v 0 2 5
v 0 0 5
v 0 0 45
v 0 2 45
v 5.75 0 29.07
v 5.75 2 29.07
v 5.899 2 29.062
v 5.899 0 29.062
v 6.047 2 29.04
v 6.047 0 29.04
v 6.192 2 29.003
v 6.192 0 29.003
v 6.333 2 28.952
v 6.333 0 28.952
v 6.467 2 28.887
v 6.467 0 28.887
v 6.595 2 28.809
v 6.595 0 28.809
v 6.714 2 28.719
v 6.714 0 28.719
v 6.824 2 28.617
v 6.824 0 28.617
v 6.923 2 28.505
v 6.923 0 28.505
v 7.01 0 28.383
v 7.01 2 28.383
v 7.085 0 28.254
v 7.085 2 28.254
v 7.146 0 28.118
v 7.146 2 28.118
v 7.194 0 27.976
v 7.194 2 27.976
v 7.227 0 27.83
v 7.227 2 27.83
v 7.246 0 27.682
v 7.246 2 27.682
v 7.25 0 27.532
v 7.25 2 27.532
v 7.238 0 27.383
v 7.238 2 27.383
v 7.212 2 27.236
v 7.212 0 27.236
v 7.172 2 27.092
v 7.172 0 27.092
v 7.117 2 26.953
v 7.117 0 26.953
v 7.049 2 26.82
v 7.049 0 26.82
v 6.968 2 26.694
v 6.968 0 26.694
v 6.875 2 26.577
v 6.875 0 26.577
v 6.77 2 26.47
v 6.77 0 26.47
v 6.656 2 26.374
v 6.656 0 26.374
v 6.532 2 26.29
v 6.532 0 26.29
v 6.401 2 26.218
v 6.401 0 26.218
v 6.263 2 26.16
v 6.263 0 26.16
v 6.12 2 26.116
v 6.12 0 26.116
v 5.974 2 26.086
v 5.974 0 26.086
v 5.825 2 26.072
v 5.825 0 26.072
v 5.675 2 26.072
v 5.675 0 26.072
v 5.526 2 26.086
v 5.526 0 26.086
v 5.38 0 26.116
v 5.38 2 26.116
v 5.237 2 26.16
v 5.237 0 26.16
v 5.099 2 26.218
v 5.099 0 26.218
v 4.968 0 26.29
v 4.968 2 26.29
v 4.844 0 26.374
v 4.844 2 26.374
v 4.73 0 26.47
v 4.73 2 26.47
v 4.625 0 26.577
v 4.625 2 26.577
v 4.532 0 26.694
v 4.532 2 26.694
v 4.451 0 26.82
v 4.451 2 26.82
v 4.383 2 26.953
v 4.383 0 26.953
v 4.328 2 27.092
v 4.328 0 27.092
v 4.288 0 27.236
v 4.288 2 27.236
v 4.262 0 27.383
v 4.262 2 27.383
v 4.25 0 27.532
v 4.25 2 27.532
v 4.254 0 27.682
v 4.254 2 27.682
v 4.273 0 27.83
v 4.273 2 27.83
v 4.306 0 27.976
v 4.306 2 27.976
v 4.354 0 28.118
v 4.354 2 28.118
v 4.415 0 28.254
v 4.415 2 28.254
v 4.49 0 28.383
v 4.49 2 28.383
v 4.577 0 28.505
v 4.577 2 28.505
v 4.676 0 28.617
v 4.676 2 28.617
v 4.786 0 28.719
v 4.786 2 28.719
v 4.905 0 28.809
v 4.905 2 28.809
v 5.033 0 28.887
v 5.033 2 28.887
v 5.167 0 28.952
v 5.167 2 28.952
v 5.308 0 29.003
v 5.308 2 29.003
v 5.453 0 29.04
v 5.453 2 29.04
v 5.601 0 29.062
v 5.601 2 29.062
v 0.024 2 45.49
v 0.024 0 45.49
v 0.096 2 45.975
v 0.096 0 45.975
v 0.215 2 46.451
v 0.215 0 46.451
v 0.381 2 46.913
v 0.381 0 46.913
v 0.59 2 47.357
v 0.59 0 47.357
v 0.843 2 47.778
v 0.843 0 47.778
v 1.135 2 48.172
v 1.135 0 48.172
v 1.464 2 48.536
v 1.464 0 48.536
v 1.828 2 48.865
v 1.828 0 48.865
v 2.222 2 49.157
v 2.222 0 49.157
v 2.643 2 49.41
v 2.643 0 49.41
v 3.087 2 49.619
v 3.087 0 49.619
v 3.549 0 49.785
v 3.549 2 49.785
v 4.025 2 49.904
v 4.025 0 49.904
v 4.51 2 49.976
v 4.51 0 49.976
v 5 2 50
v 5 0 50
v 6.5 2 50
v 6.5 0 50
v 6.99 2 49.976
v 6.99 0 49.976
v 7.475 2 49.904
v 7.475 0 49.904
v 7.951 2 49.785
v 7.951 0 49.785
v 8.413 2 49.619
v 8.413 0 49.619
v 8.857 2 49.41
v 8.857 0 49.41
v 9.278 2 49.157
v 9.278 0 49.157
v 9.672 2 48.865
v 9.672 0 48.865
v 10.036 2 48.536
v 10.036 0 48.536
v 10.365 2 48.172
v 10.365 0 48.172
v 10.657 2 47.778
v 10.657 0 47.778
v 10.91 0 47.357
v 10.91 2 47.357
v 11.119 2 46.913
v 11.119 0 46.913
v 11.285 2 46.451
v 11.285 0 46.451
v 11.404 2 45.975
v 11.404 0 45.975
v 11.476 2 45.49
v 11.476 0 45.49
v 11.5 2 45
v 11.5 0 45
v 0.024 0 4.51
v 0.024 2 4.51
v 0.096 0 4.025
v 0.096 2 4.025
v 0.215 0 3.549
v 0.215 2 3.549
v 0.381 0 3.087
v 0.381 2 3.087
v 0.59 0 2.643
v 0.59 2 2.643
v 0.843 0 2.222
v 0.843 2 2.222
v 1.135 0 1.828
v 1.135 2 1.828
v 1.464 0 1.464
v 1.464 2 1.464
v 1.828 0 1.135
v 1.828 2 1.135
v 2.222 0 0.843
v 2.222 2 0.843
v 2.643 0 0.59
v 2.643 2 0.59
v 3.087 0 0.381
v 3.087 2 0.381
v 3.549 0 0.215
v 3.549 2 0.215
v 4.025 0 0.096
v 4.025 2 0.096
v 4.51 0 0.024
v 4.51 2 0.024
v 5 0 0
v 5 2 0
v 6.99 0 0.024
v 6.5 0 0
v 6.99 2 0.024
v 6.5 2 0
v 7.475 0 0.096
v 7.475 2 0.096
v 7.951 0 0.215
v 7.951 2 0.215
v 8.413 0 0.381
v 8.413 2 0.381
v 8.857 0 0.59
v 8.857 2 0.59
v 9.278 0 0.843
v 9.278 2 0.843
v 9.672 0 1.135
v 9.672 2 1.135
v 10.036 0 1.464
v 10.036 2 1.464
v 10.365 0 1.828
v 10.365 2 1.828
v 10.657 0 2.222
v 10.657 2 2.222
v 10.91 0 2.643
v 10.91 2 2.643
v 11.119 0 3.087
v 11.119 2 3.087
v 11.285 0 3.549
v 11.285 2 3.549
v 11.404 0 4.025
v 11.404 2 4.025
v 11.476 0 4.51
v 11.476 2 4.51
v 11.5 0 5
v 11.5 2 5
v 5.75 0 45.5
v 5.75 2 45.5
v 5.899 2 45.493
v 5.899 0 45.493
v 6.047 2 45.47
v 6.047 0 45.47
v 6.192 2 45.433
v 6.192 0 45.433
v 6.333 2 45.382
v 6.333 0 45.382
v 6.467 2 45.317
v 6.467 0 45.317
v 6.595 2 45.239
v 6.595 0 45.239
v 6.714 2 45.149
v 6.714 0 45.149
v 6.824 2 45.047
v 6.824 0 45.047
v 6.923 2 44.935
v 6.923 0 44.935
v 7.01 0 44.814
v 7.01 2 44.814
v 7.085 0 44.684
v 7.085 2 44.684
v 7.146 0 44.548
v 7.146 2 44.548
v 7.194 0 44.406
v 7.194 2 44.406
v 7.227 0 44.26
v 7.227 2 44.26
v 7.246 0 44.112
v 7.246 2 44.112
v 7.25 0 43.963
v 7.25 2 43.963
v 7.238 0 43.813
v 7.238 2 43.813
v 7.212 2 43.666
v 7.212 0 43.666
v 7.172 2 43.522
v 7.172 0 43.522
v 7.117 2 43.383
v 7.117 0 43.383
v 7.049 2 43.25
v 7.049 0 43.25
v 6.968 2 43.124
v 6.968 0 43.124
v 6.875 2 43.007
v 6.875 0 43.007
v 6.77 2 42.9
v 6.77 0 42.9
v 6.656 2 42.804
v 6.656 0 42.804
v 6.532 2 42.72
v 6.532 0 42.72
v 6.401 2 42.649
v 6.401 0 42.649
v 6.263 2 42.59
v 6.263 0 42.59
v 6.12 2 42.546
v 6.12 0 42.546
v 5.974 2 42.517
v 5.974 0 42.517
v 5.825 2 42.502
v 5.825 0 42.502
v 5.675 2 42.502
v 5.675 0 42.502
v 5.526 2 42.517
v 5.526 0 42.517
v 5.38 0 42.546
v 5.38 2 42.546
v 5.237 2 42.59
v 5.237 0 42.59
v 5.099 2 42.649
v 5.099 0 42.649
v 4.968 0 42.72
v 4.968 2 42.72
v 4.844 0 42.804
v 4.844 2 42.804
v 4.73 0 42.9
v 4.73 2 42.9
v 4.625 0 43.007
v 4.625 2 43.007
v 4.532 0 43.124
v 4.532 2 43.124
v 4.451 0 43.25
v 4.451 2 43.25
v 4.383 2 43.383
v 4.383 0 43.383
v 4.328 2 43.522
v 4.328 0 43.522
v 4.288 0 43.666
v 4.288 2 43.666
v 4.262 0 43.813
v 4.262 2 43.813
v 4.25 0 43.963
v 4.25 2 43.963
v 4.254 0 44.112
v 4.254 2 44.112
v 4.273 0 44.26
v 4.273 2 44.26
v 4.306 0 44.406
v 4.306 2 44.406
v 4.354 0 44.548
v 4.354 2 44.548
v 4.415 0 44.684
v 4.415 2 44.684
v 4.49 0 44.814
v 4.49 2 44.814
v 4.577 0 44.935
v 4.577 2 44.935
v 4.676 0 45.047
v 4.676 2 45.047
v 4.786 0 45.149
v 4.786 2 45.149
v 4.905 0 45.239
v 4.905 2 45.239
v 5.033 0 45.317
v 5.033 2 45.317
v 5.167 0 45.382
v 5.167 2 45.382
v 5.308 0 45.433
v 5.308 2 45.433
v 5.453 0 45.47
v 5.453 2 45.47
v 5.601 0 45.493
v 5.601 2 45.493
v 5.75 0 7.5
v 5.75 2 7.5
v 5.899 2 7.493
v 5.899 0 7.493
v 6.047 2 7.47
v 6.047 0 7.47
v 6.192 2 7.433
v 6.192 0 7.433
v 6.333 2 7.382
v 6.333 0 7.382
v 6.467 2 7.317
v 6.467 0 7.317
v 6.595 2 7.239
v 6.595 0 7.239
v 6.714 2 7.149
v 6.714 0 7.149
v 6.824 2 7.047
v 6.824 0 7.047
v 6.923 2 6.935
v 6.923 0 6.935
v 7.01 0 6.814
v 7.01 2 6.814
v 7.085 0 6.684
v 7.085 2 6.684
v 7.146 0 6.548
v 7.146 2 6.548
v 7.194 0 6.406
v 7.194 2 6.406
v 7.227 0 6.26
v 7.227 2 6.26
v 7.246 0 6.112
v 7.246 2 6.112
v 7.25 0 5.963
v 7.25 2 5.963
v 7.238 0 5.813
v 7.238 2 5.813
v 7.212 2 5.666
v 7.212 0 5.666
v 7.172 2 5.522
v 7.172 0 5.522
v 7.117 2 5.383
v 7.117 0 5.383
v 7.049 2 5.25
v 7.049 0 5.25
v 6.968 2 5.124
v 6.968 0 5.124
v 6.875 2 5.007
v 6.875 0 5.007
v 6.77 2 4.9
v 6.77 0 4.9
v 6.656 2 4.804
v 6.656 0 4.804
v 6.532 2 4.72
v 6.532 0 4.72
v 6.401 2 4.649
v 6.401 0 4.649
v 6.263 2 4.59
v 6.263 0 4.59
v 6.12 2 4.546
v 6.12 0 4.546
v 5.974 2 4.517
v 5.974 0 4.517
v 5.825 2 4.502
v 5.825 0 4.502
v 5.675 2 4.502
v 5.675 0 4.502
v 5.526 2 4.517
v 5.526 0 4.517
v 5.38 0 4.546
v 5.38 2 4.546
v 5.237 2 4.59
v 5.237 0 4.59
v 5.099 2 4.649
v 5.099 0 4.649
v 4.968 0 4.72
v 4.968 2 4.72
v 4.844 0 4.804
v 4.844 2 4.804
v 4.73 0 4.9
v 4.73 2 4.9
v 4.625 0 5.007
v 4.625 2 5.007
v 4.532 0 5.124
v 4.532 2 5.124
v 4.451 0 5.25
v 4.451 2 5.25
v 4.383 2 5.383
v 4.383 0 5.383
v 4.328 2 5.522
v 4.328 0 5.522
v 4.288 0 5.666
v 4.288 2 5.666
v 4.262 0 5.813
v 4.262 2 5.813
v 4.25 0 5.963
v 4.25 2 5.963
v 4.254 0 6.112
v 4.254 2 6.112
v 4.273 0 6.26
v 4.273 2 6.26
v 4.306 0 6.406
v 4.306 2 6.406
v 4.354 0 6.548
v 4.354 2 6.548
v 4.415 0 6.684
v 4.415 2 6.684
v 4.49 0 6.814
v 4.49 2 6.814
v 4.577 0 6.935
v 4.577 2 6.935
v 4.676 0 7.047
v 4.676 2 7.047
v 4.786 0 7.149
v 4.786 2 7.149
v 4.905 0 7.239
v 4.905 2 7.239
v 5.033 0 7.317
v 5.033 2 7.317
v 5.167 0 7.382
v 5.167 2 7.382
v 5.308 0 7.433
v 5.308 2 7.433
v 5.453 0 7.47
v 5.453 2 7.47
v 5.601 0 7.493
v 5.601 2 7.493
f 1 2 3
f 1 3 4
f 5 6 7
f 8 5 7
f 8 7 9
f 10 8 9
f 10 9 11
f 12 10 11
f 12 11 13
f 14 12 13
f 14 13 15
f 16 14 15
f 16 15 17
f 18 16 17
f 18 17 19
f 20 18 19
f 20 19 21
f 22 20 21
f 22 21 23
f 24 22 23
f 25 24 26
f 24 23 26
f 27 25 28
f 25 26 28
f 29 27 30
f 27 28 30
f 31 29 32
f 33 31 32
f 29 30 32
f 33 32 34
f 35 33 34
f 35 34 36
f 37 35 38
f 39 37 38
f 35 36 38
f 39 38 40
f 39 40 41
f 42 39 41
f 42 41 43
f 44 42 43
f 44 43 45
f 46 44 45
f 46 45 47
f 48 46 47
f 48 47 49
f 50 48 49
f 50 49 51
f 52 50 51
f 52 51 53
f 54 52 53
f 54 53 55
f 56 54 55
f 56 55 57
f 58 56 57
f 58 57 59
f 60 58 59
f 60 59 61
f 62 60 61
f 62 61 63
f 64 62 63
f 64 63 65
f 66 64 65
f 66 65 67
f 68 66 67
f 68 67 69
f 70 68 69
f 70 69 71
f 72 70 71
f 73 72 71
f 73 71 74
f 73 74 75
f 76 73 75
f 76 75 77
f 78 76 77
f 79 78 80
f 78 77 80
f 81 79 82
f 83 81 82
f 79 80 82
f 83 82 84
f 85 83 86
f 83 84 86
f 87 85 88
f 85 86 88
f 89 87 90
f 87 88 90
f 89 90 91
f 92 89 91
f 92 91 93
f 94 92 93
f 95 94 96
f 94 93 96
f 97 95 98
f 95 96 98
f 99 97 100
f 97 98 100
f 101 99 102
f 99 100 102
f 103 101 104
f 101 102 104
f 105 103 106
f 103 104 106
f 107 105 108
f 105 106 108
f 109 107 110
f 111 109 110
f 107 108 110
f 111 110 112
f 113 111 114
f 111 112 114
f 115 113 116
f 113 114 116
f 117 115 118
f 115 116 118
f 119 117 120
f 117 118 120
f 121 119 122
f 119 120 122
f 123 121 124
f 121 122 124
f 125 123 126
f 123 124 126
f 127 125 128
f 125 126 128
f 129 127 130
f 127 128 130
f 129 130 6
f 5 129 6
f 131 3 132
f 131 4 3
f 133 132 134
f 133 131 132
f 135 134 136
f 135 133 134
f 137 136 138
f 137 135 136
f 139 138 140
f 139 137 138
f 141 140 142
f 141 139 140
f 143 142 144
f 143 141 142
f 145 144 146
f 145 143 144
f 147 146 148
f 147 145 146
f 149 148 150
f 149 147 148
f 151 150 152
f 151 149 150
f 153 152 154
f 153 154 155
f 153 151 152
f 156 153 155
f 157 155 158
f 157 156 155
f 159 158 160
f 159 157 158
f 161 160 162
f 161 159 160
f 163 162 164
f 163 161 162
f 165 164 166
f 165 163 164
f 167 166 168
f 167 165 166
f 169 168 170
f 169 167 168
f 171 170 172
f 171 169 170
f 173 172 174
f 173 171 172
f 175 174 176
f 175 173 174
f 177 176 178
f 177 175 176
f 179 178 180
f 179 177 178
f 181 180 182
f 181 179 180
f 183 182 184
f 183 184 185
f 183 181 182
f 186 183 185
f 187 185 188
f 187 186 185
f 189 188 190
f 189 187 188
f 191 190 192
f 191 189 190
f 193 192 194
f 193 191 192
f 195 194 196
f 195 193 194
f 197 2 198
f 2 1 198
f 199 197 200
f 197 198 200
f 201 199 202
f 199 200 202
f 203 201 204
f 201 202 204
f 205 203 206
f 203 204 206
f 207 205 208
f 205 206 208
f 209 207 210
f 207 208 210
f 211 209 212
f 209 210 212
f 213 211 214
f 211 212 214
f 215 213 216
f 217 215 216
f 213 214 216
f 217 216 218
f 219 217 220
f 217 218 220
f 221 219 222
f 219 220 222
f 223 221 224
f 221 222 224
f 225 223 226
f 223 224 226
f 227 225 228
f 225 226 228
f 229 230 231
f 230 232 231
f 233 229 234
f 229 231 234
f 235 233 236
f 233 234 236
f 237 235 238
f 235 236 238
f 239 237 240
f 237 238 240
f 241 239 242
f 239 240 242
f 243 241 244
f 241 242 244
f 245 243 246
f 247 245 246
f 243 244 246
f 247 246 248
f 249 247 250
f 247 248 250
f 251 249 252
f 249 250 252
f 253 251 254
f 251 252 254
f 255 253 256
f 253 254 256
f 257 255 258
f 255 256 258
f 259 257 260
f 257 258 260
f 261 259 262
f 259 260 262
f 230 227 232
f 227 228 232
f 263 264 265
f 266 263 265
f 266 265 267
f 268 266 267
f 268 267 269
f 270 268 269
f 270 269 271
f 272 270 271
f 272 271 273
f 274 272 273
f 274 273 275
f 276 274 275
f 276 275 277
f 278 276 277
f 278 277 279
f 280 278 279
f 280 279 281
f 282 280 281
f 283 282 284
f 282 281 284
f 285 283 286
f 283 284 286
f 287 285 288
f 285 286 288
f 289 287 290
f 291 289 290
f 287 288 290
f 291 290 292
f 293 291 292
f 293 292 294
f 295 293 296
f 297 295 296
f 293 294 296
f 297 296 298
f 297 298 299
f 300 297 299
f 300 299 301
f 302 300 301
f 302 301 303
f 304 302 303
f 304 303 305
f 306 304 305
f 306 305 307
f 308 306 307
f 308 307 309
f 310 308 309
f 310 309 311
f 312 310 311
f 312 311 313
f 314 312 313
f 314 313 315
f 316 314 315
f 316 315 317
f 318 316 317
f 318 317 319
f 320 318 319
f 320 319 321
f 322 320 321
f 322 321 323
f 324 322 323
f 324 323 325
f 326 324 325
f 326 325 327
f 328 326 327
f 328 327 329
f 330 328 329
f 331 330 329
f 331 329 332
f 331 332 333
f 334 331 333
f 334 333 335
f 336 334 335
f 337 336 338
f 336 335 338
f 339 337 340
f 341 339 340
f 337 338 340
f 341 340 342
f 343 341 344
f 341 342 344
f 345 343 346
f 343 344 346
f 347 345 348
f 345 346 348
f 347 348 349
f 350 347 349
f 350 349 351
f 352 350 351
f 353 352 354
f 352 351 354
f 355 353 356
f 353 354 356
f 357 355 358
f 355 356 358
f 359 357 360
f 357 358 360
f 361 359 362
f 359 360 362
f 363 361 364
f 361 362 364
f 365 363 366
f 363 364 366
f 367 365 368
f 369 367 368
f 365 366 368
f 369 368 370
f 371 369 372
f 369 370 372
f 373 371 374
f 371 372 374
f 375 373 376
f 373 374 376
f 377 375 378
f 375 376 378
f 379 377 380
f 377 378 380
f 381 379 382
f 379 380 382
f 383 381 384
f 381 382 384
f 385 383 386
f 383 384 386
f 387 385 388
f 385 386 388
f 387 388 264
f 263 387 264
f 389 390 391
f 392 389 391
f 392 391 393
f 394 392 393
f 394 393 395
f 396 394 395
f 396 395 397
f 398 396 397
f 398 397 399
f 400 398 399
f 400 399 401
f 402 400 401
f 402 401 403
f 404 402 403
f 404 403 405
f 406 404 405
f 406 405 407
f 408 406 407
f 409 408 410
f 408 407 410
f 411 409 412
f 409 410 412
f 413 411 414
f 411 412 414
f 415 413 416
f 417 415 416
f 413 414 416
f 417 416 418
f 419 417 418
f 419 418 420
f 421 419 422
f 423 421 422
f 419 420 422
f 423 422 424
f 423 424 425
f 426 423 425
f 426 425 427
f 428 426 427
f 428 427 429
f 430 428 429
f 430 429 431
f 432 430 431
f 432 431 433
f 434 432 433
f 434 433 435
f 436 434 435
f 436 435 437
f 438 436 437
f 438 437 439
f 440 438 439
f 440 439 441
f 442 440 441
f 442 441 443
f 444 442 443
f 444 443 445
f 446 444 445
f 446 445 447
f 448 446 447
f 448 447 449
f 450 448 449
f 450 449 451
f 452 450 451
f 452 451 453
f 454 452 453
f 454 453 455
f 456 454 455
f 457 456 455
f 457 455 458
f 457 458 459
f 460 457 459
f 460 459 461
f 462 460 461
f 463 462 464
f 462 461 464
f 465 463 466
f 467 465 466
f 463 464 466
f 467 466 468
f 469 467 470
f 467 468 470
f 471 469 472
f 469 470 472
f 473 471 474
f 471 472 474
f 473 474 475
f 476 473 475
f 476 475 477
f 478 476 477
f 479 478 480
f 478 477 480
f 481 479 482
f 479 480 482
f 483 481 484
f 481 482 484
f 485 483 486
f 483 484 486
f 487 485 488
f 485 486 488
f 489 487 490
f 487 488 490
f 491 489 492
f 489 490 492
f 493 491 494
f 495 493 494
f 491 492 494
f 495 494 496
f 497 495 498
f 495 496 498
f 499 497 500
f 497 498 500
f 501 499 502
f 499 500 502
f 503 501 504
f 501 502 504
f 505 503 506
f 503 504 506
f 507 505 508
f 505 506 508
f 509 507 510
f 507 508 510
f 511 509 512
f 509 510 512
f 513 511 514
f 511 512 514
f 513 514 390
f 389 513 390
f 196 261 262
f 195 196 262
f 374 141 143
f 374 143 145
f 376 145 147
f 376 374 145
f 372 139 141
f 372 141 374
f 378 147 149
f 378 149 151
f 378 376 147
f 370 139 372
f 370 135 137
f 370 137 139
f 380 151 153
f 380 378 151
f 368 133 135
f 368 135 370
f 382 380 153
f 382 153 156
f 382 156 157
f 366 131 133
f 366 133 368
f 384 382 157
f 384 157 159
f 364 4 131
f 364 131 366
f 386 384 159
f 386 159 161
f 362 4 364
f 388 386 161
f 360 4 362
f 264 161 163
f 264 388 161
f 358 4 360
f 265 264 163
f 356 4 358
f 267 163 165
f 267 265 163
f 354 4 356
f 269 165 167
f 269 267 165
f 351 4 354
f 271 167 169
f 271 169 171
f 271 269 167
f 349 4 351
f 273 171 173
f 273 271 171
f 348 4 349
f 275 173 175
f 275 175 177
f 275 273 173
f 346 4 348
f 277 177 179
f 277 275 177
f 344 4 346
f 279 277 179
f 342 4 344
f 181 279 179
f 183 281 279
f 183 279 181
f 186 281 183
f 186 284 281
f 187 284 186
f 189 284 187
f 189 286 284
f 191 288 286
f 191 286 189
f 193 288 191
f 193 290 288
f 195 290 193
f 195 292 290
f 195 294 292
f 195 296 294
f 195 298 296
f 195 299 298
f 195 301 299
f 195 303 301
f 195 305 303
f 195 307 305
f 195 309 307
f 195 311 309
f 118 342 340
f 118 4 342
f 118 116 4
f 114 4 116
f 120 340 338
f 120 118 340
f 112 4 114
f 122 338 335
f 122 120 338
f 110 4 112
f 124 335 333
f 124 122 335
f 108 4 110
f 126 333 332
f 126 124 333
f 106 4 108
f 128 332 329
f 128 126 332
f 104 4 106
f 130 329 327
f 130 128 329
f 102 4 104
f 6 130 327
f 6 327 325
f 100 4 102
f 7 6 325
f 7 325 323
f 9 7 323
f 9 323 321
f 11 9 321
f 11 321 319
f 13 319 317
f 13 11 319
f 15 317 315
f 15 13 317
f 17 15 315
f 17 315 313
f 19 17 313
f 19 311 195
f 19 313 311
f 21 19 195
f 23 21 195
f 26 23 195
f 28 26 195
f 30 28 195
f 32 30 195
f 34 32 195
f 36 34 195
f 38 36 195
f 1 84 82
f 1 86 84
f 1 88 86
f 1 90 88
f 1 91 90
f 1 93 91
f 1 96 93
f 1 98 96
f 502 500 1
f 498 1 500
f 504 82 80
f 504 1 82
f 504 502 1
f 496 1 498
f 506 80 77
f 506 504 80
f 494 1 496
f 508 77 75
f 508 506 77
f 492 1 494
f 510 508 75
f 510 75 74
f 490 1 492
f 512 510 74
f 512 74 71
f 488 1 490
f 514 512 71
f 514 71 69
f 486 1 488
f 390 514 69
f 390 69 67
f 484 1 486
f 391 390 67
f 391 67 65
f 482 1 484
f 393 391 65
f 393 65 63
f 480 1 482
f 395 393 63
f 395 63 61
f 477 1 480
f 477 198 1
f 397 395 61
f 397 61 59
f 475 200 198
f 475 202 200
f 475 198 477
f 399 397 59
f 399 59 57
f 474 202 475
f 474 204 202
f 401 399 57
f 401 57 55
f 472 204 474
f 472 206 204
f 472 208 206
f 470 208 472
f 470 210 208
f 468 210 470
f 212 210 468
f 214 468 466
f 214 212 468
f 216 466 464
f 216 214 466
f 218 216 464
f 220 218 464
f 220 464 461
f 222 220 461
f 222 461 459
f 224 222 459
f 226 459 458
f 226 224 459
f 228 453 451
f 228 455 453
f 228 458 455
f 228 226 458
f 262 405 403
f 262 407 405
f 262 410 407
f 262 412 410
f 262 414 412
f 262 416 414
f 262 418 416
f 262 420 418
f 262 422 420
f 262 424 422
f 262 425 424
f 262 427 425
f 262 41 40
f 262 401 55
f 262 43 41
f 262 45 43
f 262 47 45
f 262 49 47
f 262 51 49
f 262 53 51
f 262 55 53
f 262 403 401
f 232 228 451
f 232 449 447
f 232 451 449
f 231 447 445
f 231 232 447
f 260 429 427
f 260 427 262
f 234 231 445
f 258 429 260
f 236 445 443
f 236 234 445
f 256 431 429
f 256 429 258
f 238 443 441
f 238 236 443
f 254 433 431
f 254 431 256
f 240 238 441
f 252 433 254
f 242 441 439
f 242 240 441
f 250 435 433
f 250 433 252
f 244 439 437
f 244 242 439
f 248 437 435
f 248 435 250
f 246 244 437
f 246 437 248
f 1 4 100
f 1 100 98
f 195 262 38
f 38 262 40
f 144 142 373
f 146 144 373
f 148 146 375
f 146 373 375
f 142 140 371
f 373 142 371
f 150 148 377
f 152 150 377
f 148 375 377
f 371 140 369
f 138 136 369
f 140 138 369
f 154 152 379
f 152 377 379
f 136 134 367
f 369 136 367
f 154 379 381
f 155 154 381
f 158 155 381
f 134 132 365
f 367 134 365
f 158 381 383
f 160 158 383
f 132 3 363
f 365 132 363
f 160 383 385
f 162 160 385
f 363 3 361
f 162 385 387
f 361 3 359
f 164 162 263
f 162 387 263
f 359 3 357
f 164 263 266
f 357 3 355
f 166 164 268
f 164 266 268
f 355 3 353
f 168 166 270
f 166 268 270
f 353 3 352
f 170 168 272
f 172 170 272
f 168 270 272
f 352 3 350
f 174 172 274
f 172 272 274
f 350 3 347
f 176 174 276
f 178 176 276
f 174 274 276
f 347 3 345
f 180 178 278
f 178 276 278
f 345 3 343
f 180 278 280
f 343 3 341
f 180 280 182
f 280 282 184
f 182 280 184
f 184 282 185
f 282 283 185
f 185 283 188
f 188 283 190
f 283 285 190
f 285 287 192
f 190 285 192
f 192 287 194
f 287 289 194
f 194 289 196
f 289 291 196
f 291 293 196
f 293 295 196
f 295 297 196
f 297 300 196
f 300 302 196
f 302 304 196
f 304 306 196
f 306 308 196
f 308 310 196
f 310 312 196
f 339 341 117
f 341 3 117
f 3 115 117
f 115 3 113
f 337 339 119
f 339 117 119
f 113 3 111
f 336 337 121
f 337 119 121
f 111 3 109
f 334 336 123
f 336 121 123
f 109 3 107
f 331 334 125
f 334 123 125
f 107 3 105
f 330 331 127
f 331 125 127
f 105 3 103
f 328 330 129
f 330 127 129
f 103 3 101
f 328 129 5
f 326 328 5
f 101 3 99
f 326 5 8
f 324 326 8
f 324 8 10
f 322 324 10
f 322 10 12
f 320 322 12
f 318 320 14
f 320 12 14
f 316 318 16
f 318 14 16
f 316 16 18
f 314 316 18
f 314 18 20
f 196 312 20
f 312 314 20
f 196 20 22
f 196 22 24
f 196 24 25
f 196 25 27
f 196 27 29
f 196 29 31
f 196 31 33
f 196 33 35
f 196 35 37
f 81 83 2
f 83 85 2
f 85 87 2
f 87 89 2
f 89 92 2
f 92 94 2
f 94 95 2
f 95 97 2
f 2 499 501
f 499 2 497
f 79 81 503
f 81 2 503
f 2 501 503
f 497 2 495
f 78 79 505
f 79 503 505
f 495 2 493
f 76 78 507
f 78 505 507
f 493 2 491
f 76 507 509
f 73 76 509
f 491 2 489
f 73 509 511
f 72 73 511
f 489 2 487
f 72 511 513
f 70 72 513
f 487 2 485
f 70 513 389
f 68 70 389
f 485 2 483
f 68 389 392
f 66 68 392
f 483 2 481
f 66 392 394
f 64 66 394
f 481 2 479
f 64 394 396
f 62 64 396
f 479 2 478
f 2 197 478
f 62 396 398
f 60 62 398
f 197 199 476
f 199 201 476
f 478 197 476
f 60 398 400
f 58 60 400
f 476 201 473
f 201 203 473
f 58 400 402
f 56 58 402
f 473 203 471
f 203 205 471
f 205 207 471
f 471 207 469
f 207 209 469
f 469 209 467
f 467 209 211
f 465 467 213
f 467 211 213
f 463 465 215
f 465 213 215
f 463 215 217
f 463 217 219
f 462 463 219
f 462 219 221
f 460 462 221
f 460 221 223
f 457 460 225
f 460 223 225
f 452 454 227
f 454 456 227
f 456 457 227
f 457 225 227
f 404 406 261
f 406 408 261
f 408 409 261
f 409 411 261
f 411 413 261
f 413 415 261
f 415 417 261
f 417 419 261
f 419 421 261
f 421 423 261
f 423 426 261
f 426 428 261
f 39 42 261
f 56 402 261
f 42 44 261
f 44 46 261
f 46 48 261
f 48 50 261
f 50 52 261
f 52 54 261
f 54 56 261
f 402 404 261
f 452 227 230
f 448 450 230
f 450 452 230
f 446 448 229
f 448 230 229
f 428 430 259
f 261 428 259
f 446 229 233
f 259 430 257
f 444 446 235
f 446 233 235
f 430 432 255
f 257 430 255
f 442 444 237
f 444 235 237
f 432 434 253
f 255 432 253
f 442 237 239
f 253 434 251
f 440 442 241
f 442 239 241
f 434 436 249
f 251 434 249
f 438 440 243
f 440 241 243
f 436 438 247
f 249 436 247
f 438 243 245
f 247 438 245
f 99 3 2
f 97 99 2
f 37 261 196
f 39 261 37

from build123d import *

# Parameters (mm, degrees)
ESQUISSE1_W             = 11.5
ESQUISSE1_H             = 2
EXTRU_MINCE1_DEPTH      = 50
ESQUISSE2_R             = 1.5
ENL_V_MAT_EXTRU_1_DEPTH = 3
CONG_1_R                = 5


with BuildPart() as part:
    # Esquisse1 → Extru.-Mince1 (new body)
    with BuildSketch(Plane.XY):
        with Locations((5.75, 1)):
            Rectangle(ESQUISSE1_W, ESQUISSE1_H)
    extrude(amount=EXTRU_MINCE1_DEPTH)

    # Esquisse2 → Enlèv. mat.-Extru.1 (cut)
    with BuildSketch(Plane(origin=(0, 2, 0), x_dir=(1, 0, 0), z_dir=(0, 1, 0))):
        with Locations(Location((5.75, -6, 0), (0, 0, 270))):
            Circle(ESQUISSE2_R)
        with Locations(Location((5.75, -27.56965461, 0), (0, 0, 270))):
            Circle(ESQUISSE2_R)
        with Locations(Location((5.75, -44, 0), (0, 0, 270))):
            Circle(ESQUISSE2_R)
    extrude(amount=-ENL_V_MAT_EXTRU_1_DEPTH, mode=Mode.SUBTRACT)

    # Congé1
    cong_1_edges = [part.edges().sort_by_distance(p)[0] for p in [
        (0, 1, 50),
        (0, 1, 0),
        (11.5, 1, 0),
        (11.5, 1, 50),
    ]]
    fillet(cong_1_edges, radius=CONG_1_R)


solid = part.part
